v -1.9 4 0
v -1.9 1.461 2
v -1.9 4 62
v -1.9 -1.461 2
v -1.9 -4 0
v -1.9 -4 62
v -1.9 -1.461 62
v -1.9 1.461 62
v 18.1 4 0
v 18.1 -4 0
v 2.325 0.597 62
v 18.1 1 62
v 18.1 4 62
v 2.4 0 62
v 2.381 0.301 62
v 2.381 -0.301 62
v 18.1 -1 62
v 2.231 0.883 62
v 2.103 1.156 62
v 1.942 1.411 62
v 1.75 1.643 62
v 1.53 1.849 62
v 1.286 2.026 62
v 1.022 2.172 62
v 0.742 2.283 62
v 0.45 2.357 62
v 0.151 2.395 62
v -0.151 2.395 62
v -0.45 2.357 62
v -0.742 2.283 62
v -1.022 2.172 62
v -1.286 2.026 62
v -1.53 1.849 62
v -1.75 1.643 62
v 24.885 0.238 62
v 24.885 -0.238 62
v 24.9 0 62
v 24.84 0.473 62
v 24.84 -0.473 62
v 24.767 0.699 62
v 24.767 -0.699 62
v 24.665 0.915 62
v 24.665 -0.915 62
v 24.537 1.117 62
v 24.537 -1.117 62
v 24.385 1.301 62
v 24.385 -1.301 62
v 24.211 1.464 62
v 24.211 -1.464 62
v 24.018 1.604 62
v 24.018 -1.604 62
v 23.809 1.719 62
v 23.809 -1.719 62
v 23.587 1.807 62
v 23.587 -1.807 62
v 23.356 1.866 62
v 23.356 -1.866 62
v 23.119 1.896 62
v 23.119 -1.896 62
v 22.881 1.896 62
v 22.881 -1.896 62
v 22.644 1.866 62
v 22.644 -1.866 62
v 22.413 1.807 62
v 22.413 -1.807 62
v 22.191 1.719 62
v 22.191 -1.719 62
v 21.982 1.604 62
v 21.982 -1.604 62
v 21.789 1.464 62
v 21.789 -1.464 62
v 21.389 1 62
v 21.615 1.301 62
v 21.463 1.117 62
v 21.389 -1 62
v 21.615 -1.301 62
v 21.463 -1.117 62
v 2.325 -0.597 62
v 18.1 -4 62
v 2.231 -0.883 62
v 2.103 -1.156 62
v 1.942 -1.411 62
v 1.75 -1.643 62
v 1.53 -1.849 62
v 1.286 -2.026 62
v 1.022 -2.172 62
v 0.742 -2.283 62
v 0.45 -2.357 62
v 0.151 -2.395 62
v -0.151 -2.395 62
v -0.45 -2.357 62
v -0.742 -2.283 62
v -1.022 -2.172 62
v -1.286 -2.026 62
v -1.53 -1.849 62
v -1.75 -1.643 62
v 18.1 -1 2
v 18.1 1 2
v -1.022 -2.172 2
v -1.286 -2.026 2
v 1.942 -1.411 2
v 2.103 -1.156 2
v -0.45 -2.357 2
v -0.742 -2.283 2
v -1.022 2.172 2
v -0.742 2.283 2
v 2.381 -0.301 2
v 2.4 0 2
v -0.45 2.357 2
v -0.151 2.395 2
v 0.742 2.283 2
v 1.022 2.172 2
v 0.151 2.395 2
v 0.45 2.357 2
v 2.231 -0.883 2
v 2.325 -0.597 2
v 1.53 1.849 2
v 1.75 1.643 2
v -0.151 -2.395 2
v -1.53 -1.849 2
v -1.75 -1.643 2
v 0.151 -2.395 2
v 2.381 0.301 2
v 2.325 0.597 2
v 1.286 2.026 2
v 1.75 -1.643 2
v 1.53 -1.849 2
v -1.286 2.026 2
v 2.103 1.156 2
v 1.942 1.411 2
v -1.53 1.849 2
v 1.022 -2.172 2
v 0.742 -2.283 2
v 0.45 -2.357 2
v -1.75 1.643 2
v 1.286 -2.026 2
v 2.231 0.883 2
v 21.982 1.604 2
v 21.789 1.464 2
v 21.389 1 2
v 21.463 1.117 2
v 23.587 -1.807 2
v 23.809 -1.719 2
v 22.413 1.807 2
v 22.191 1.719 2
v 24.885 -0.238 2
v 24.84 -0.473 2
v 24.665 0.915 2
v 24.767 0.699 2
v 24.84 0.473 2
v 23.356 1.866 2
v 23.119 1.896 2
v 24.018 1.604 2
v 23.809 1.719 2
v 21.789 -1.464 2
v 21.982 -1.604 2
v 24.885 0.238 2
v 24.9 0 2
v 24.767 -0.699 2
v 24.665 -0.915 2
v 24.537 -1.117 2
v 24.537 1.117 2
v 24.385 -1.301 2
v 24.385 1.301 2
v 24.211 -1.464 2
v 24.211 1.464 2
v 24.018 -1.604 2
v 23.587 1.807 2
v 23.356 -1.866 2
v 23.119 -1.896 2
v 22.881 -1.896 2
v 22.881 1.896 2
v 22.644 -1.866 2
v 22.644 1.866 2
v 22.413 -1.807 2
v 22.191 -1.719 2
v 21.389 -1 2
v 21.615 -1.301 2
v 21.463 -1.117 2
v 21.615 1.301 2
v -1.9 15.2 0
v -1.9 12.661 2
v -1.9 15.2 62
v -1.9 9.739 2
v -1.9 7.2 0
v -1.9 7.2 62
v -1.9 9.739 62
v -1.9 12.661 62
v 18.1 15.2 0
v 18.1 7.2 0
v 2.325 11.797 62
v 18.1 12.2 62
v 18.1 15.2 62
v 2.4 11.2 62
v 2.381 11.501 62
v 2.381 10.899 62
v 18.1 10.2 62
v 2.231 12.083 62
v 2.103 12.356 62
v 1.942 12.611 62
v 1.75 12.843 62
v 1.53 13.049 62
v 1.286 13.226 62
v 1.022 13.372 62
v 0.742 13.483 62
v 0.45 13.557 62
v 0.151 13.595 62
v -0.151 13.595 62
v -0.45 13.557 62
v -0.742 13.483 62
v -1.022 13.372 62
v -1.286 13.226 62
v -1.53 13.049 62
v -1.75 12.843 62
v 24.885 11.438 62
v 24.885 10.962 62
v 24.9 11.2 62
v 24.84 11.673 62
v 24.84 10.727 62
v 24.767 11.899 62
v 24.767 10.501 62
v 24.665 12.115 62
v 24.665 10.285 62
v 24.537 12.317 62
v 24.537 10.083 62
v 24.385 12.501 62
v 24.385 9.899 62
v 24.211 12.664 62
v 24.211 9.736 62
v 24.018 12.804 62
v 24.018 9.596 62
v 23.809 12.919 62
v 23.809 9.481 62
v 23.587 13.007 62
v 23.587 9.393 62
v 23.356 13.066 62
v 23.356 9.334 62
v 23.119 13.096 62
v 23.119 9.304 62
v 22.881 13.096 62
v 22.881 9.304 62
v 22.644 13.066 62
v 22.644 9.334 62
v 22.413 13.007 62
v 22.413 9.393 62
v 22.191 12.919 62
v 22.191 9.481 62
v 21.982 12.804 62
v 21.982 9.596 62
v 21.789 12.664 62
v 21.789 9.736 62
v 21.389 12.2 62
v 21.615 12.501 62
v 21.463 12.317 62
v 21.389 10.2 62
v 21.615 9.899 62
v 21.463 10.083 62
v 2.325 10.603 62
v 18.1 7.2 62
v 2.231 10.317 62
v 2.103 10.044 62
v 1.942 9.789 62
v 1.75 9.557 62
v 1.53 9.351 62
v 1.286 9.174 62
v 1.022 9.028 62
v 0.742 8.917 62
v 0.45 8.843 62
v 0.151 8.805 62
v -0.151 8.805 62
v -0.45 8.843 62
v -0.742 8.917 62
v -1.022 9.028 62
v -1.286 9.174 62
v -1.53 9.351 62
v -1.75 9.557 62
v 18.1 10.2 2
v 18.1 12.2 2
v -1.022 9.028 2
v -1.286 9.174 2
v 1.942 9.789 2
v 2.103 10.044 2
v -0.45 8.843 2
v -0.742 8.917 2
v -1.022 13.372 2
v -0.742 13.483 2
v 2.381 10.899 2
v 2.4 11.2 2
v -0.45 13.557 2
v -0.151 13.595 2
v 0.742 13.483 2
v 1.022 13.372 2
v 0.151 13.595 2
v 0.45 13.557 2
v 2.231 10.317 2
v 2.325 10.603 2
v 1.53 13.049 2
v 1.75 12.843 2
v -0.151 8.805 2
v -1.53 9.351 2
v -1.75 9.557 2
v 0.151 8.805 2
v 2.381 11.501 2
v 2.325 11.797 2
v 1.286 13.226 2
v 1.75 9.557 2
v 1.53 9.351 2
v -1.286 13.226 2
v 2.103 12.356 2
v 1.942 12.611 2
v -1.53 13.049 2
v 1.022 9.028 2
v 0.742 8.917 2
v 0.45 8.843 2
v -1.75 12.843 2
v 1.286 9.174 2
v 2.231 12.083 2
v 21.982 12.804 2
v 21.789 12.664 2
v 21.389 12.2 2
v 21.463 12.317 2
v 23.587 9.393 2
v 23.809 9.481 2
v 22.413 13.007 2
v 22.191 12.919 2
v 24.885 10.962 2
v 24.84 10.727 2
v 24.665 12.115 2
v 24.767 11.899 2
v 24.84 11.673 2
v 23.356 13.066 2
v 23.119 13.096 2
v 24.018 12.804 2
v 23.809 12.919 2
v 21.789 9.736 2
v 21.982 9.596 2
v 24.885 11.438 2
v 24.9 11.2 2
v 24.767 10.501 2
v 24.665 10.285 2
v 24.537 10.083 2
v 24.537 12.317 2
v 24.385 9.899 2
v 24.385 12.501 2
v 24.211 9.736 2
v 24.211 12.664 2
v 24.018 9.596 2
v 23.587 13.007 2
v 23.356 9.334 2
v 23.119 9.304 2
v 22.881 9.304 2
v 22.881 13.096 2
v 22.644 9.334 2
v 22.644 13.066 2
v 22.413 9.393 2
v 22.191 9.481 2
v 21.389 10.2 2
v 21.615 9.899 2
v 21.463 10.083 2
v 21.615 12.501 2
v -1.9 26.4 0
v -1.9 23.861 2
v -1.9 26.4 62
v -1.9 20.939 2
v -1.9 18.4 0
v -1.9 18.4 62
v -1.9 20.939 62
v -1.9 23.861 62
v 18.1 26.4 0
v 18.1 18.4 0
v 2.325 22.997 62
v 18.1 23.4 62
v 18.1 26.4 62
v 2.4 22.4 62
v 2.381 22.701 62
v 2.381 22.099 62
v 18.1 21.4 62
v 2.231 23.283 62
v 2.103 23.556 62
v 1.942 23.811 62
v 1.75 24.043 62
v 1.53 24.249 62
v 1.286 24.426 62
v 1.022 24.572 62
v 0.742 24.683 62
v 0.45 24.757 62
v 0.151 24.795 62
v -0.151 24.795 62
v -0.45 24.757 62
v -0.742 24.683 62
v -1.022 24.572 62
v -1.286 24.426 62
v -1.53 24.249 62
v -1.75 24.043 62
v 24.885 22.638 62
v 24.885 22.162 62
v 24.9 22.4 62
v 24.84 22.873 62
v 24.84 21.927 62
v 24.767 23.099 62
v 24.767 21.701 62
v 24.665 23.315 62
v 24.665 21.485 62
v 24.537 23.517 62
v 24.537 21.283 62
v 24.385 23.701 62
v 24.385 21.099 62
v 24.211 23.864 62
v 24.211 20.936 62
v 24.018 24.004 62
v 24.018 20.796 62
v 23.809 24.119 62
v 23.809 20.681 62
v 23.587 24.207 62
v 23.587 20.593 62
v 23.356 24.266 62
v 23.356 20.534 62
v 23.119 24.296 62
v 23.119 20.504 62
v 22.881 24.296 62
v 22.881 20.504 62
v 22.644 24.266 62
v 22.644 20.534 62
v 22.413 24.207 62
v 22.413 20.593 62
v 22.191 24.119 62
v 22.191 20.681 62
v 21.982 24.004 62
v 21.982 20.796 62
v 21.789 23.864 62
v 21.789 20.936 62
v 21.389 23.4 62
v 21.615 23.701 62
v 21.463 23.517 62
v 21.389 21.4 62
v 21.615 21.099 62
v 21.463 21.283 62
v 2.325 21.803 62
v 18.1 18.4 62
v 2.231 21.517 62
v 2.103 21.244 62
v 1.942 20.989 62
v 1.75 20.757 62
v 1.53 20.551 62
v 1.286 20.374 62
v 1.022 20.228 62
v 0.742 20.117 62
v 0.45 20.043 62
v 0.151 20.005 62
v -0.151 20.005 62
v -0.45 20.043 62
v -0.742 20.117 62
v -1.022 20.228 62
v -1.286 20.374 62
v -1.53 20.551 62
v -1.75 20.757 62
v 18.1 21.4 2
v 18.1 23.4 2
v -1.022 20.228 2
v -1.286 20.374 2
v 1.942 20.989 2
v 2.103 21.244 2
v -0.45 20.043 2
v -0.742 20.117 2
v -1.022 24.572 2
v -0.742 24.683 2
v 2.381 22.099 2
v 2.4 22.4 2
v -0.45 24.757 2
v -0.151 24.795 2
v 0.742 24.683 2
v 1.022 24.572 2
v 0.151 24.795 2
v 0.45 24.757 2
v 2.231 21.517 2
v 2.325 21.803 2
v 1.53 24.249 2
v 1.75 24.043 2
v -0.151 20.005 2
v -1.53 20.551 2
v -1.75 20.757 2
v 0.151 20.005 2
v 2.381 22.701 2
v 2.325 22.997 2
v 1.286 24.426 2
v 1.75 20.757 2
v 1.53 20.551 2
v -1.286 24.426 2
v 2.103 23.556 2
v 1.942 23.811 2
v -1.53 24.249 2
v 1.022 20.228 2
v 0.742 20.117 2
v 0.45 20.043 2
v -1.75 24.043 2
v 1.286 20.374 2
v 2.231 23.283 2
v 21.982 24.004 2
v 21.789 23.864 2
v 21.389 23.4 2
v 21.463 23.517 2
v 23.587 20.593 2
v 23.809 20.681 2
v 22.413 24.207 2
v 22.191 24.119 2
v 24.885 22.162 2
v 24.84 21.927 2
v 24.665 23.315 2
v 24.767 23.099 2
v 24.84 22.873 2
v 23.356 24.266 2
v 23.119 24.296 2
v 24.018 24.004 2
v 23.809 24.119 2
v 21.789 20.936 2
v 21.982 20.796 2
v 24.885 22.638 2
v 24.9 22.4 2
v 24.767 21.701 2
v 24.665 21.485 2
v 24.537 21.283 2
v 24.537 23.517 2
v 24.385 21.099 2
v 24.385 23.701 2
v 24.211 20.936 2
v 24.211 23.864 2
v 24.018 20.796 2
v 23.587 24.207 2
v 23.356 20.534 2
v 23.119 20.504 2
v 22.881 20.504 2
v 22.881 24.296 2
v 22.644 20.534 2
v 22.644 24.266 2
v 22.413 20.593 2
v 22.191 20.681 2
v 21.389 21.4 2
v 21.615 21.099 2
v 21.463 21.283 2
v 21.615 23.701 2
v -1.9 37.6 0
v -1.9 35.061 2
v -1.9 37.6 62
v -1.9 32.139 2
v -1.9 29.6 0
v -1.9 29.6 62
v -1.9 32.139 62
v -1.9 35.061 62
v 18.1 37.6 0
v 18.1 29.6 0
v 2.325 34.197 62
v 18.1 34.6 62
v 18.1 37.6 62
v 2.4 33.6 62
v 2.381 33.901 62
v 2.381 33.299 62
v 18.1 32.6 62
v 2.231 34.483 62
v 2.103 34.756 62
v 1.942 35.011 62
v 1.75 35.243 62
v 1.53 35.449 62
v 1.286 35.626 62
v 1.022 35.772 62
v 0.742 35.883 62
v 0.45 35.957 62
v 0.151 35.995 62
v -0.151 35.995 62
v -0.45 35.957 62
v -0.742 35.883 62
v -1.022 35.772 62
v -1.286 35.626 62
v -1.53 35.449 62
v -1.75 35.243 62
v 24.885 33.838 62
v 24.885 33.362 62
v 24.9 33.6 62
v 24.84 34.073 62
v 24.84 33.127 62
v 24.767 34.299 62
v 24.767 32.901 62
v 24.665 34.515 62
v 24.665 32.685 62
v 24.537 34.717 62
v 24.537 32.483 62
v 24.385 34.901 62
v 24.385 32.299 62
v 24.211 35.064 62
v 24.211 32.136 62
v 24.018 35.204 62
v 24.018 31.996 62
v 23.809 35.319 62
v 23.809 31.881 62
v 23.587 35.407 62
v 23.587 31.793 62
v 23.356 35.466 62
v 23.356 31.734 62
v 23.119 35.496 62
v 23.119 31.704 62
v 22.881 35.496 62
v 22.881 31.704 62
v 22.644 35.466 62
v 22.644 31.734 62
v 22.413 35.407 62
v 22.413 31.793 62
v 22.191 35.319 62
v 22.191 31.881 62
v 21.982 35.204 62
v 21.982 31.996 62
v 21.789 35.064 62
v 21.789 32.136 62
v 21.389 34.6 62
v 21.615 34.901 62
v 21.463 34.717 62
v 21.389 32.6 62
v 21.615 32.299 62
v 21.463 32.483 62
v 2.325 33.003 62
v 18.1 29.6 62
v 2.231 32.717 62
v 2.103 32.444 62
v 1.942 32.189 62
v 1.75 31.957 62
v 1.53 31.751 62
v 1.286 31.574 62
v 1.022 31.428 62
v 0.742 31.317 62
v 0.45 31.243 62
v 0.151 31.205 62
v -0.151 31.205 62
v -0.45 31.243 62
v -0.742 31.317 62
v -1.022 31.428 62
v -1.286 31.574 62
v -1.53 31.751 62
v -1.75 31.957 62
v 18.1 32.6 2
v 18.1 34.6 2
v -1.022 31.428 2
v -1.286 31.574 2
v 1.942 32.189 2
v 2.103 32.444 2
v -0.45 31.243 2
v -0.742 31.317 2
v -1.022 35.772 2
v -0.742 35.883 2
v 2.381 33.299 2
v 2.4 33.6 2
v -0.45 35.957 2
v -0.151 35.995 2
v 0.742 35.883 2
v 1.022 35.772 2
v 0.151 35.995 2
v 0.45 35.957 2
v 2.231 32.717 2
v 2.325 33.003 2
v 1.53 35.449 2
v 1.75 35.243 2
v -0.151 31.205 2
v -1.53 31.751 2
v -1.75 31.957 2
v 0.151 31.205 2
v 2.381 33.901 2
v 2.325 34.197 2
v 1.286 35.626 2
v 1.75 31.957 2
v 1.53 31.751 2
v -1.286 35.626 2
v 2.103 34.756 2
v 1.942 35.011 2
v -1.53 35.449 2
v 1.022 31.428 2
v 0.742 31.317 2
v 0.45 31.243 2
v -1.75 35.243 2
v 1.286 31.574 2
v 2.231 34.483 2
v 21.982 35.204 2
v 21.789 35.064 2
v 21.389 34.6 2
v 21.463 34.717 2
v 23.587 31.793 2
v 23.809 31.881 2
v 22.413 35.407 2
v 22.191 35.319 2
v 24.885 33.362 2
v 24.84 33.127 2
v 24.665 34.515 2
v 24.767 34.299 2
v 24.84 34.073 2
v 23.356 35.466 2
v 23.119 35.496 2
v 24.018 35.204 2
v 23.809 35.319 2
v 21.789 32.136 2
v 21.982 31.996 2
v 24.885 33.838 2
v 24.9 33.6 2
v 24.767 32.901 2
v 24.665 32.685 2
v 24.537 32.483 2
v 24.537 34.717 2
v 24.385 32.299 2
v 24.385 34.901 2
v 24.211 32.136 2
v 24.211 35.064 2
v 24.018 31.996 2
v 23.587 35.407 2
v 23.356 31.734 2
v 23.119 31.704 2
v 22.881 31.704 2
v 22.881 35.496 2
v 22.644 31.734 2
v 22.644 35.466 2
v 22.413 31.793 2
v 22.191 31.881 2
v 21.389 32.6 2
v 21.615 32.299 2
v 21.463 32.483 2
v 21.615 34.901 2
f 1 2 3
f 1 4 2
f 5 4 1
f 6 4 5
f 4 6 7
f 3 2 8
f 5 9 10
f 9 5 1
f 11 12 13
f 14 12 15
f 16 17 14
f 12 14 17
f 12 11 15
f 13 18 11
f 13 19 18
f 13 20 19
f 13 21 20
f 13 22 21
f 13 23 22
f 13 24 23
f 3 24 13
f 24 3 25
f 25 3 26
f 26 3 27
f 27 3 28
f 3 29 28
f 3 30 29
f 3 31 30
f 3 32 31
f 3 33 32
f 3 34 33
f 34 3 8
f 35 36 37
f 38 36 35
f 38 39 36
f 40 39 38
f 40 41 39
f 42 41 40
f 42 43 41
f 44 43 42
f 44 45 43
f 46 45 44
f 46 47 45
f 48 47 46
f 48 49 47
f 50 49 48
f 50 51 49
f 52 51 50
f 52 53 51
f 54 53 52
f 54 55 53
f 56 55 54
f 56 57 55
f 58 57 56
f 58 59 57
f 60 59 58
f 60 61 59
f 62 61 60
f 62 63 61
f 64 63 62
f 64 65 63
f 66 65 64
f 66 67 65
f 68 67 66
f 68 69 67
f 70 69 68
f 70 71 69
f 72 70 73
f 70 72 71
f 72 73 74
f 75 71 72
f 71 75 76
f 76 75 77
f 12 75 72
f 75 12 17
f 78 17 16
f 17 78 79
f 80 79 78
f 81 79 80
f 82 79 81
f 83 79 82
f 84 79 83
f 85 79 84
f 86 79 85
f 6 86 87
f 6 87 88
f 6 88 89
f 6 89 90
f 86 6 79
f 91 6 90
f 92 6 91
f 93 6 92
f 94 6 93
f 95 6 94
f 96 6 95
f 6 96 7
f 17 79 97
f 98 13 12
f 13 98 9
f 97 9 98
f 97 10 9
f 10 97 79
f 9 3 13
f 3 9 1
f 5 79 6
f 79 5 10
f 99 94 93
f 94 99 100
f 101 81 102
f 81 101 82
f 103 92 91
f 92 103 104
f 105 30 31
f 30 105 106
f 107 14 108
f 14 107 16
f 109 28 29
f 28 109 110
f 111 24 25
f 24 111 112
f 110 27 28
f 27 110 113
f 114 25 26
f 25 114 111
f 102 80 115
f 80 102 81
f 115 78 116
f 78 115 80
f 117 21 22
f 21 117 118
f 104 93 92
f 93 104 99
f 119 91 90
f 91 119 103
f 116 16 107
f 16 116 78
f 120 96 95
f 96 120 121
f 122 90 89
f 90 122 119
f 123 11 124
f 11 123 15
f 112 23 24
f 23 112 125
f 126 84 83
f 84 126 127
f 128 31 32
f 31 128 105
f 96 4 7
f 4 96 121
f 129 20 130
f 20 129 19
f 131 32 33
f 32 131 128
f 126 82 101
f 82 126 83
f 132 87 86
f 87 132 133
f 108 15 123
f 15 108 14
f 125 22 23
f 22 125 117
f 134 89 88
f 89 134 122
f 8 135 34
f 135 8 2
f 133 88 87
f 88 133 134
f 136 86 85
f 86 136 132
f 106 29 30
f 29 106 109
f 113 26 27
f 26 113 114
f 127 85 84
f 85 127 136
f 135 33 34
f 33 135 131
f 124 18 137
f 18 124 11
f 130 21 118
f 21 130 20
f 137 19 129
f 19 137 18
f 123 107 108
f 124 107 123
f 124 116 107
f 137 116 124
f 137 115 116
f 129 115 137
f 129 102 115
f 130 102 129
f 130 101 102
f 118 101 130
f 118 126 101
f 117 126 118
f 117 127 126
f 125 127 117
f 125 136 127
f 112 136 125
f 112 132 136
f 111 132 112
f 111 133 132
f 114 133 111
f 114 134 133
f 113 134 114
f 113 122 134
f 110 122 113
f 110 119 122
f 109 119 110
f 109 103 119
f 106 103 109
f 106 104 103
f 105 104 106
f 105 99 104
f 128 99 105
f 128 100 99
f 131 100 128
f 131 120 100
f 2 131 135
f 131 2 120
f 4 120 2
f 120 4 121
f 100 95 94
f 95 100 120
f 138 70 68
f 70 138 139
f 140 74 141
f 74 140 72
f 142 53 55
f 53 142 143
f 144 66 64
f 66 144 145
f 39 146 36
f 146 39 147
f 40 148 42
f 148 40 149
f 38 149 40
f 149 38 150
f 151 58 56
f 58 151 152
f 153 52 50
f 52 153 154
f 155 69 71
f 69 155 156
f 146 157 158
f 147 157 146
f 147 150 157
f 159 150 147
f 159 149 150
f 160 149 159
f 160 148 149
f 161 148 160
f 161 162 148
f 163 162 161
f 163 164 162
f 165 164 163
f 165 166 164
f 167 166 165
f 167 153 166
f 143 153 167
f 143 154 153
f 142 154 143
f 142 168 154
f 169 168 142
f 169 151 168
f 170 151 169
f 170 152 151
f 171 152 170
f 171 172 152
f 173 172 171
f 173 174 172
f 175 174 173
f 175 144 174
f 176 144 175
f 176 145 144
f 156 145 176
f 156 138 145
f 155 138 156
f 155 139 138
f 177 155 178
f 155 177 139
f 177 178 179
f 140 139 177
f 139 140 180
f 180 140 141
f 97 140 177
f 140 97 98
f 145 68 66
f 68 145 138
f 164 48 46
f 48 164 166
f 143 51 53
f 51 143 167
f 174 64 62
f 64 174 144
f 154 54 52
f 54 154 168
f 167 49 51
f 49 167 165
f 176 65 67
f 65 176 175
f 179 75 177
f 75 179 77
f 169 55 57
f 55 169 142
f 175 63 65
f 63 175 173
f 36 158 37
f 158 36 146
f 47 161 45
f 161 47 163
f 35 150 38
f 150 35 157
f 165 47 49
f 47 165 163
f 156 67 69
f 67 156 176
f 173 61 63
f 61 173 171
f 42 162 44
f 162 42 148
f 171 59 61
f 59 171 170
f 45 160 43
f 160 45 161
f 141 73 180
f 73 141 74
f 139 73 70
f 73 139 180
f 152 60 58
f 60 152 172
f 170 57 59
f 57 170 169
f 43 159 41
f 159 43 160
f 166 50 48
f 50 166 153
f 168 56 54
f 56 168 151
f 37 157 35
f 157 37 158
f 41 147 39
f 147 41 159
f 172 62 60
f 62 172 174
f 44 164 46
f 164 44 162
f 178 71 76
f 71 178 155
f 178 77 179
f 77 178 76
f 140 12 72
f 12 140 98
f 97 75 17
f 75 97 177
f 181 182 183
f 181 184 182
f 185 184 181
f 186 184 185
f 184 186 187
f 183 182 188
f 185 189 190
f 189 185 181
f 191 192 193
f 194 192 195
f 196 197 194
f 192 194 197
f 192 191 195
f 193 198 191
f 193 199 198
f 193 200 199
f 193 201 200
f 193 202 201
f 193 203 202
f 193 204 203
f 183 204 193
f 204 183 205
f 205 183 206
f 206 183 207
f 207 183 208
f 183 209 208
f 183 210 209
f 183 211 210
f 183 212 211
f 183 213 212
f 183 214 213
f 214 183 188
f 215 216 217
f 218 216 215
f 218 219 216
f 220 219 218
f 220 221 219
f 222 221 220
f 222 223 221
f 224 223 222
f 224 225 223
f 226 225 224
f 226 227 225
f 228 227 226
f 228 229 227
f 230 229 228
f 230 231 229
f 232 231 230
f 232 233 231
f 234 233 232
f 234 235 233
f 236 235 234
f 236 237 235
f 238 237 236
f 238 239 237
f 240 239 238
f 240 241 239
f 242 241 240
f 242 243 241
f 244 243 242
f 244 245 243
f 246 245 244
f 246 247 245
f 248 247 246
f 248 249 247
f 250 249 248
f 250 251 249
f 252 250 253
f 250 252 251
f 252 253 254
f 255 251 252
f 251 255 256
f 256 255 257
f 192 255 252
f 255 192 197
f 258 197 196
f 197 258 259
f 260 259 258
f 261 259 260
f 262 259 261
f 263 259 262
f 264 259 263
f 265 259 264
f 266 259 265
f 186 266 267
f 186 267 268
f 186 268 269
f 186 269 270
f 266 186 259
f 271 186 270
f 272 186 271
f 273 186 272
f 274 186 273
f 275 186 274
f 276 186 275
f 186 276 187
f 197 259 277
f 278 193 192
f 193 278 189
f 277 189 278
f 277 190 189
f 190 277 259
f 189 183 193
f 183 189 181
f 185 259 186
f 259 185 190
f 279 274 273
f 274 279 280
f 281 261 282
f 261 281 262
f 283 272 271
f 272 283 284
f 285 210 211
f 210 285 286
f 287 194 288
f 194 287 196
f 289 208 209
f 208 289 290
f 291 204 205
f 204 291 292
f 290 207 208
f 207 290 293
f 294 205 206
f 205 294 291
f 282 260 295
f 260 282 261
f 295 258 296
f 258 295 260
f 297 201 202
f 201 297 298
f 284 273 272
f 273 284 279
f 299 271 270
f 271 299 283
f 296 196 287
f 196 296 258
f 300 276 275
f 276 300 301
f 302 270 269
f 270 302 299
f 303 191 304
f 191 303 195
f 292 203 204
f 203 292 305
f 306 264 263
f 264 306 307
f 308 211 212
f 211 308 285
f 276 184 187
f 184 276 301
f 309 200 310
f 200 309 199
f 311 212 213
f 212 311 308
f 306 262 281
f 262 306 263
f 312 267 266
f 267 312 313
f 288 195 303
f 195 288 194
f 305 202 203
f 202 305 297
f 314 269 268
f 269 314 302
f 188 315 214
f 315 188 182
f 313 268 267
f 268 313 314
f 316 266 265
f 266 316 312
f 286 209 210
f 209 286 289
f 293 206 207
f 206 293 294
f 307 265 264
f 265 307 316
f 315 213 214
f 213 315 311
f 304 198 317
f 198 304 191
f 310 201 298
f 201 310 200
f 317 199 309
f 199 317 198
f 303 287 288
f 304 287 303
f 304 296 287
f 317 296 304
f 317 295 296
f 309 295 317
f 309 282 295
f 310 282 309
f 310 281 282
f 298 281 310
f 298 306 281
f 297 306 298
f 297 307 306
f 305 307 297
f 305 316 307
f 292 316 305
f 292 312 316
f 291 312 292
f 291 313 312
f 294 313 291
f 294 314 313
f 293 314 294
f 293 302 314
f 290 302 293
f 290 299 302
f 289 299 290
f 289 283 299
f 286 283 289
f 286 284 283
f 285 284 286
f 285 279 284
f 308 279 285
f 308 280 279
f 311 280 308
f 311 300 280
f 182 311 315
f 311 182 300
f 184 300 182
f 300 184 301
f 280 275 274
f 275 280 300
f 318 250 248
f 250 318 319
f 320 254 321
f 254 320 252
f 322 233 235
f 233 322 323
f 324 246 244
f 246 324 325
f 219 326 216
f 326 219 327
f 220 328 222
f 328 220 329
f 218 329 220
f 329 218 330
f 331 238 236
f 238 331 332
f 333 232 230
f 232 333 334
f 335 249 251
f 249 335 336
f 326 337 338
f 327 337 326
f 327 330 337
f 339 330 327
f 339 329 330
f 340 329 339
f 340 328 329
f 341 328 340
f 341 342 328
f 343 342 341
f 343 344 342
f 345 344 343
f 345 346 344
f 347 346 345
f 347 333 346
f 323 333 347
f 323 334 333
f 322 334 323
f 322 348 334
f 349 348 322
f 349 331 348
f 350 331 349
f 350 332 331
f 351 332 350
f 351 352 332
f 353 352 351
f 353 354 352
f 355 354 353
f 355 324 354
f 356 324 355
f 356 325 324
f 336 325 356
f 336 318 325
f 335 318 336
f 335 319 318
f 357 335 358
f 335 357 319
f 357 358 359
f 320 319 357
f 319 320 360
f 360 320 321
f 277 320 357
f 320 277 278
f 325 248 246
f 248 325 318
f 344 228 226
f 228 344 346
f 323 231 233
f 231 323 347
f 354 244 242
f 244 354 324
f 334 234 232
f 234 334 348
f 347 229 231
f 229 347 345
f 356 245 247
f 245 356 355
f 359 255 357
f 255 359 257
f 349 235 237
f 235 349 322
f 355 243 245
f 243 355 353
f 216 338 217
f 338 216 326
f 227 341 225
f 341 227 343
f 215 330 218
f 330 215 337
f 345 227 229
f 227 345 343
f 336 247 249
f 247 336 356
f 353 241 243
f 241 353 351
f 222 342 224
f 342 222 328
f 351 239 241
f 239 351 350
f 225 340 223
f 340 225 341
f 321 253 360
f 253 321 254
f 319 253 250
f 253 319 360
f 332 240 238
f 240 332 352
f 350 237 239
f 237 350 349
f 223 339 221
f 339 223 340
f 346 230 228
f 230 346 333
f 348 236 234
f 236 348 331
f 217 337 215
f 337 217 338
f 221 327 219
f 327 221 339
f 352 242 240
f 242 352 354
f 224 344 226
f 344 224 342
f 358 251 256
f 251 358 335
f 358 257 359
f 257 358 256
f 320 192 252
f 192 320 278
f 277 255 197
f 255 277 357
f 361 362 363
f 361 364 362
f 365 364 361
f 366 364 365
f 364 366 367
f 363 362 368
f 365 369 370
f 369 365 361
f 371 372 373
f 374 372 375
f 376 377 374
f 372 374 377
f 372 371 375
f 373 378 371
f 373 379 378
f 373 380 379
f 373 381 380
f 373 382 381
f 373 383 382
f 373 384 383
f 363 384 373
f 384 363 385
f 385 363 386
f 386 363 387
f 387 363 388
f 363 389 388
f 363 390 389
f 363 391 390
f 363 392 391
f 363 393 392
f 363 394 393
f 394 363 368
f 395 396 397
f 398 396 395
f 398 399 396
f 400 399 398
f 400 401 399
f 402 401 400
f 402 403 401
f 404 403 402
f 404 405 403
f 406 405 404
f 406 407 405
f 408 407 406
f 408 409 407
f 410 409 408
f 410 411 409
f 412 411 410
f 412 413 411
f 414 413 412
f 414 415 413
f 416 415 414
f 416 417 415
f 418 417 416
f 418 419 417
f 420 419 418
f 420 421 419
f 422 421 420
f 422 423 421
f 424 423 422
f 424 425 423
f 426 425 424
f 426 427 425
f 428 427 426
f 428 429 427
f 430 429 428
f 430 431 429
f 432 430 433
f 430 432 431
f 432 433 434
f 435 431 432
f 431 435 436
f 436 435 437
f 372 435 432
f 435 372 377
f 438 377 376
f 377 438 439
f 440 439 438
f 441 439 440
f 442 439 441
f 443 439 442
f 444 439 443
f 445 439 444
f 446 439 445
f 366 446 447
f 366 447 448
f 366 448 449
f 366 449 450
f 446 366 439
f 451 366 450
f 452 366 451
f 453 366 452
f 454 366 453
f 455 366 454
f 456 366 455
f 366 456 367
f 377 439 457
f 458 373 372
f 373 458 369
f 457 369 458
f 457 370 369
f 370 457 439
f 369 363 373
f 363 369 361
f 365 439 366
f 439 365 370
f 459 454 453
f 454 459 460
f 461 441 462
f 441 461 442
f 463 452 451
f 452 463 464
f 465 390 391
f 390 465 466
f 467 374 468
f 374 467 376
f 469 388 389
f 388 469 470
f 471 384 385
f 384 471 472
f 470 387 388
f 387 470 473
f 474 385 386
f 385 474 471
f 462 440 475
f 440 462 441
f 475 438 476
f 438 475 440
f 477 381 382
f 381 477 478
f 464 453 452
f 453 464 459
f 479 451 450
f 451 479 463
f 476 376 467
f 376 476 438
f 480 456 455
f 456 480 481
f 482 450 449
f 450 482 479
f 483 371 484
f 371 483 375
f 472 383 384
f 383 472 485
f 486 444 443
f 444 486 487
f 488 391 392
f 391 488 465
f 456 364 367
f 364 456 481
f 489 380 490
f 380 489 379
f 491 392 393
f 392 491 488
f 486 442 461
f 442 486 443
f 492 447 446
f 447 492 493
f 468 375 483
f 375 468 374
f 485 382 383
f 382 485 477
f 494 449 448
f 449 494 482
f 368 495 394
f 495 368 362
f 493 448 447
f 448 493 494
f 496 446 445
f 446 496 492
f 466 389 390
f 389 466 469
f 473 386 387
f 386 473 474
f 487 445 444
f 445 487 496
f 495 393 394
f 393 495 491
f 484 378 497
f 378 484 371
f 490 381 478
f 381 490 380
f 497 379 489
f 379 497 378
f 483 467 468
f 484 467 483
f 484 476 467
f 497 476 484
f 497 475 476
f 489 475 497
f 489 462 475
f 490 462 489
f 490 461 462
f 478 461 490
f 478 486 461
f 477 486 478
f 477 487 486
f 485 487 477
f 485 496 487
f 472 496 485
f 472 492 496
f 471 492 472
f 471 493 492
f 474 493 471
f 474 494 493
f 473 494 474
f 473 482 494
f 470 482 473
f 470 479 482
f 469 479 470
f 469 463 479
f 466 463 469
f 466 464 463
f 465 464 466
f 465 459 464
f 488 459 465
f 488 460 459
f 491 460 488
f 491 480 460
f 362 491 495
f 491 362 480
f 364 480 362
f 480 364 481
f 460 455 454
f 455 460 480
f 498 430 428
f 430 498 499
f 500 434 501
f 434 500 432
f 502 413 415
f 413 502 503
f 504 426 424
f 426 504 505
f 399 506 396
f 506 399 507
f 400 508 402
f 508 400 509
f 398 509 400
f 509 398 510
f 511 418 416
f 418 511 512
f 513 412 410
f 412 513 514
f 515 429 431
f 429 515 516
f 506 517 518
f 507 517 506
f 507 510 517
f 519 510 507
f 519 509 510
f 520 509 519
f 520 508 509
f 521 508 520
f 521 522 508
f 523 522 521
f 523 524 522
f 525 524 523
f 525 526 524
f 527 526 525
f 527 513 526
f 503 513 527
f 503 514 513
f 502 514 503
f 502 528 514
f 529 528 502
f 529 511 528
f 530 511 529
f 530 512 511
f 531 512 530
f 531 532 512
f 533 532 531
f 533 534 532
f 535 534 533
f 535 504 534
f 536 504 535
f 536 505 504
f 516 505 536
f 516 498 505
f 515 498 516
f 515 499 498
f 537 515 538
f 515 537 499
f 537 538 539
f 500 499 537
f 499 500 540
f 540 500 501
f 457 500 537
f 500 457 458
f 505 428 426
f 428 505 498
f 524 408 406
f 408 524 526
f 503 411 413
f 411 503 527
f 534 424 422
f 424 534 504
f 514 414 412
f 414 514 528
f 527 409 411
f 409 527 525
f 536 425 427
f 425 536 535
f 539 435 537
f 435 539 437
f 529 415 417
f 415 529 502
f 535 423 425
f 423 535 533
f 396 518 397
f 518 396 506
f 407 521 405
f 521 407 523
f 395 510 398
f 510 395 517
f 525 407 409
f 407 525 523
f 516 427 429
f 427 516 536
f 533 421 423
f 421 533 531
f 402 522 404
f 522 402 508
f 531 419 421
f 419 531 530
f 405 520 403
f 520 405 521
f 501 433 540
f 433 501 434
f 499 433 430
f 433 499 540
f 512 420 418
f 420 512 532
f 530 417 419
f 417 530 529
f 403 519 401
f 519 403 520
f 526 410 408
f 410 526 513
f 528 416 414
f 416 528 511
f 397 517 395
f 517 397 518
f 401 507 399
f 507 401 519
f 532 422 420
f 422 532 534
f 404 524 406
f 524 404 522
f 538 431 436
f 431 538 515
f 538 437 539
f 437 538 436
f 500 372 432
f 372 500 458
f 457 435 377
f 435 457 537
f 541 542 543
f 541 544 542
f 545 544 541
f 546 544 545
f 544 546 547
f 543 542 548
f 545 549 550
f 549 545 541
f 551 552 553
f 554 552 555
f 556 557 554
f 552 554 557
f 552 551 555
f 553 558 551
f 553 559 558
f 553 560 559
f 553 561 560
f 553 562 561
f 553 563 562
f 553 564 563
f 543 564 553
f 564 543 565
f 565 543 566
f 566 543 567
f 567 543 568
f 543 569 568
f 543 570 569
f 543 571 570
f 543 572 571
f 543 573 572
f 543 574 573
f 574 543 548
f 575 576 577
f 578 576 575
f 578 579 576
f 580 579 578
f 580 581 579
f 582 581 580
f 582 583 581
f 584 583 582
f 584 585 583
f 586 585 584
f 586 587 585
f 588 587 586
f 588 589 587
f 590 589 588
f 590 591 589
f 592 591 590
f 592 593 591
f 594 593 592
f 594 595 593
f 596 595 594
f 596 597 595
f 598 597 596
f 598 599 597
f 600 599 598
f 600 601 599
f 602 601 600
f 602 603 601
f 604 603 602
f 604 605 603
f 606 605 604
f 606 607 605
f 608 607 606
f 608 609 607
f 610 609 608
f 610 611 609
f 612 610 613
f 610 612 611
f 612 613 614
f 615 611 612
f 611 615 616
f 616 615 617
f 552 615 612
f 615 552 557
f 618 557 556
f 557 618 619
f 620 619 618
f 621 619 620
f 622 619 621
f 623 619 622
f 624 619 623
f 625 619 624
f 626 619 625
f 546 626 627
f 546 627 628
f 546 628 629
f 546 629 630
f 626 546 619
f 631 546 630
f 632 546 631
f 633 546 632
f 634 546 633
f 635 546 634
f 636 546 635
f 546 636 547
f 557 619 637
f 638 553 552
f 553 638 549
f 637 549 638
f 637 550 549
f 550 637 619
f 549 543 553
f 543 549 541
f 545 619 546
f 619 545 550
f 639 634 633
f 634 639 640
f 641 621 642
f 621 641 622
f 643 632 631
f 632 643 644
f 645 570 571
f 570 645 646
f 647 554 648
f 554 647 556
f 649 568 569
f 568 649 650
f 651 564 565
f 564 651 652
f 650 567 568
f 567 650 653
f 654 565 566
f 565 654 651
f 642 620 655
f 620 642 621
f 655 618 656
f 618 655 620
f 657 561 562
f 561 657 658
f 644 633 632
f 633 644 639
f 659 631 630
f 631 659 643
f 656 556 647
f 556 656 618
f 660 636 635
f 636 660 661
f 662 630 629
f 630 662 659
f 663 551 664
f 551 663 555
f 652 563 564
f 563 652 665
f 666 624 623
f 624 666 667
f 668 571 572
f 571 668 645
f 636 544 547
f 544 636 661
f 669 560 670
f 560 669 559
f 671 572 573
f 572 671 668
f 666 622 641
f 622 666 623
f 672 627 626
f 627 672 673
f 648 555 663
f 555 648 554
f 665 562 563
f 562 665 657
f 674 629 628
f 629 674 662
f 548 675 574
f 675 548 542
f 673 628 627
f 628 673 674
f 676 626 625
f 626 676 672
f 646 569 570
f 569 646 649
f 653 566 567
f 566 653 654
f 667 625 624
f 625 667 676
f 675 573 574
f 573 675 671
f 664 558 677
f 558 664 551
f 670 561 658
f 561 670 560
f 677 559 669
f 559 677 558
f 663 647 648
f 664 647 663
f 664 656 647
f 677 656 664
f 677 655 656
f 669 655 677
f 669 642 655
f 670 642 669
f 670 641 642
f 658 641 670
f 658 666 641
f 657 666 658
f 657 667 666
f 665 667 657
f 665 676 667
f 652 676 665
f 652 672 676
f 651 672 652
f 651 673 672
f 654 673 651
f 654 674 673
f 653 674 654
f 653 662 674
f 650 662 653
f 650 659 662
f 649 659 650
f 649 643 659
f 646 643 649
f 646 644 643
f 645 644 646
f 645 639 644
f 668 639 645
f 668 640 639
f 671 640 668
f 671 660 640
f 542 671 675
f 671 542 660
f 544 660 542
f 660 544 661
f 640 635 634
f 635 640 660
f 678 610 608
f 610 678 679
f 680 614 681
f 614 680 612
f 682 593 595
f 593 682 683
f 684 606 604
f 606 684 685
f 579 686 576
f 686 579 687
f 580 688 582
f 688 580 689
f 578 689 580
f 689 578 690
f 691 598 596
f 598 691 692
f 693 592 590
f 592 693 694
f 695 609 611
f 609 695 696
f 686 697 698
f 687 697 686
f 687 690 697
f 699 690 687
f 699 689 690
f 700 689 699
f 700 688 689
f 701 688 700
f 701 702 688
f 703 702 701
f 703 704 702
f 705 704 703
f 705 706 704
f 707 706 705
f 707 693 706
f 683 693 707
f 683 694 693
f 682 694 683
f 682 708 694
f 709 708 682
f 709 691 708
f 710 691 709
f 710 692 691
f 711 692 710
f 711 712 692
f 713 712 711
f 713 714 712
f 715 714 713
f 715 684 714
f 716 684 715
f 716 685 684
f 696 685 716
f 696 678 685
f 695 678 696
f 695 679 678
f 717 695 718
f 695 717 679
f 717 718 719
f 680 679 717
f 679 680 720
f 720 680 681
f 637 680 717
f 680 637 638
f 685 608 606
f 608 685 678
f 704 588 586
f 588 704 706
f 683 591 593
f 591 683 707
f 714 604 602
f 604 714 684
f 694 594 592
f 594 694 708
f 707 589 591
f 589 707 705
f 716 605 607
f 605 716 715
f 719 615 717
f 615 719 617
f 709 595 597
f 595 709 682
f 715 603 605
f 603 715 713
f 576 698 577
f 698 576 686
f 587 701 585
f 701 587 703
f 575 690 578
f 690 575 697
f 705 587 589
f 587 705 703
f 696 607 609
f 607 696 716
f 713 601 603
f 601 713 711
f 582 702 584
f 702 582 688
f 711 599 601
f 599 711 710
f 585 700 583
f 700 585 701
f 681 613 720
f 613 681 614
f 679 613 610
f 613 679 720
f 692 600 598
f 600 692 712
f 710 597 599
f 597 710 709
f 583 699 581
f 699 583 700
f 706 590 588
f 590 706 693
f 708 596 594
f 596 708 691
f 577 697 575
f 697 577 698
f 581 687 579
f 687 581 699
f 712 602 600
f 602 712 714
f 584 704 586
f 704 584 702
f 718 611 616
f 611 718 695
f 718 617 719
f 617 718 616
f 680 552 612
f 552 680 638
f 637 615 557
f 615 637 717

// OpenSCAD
// "Mattress"
// Based on an original idea of Antonia (7yo)
// (c) 2018 Harald Mühlhoff, 58300 Wetter, Germany

// Mattress Width
a = 62;

// Mattress Height
e = 8;

// Outer diameter joint
b = e*0.6;

// Inner diameter joint
c= b-1;

// Segment Length
d = 20;



// Distance between segments
f = 3;

// Height joint
g = 2;

// Height "stopper"
h = 2;


// Number of segments
i = 4;

$fn=50;




for(it=[0: i-1]) {

    translate([0, it*e*1.4, a])
    rotate([0,180, 0]) {

        // Joint
        translate([-d-f,0,0])
        cylinder(d=c, h=a-h);

        // Connection Joint to Cube
        translate([-d-c/2, -g/2, 0])
        cube([c/2+f, g, a-h]);


        difference() {
            // Cube
            translate([-d+c/2, -e/2, 0])
            cube([d, e, a]);

            // place for joint
            cylinder(d=b, h=a-h);
        }

}
}
